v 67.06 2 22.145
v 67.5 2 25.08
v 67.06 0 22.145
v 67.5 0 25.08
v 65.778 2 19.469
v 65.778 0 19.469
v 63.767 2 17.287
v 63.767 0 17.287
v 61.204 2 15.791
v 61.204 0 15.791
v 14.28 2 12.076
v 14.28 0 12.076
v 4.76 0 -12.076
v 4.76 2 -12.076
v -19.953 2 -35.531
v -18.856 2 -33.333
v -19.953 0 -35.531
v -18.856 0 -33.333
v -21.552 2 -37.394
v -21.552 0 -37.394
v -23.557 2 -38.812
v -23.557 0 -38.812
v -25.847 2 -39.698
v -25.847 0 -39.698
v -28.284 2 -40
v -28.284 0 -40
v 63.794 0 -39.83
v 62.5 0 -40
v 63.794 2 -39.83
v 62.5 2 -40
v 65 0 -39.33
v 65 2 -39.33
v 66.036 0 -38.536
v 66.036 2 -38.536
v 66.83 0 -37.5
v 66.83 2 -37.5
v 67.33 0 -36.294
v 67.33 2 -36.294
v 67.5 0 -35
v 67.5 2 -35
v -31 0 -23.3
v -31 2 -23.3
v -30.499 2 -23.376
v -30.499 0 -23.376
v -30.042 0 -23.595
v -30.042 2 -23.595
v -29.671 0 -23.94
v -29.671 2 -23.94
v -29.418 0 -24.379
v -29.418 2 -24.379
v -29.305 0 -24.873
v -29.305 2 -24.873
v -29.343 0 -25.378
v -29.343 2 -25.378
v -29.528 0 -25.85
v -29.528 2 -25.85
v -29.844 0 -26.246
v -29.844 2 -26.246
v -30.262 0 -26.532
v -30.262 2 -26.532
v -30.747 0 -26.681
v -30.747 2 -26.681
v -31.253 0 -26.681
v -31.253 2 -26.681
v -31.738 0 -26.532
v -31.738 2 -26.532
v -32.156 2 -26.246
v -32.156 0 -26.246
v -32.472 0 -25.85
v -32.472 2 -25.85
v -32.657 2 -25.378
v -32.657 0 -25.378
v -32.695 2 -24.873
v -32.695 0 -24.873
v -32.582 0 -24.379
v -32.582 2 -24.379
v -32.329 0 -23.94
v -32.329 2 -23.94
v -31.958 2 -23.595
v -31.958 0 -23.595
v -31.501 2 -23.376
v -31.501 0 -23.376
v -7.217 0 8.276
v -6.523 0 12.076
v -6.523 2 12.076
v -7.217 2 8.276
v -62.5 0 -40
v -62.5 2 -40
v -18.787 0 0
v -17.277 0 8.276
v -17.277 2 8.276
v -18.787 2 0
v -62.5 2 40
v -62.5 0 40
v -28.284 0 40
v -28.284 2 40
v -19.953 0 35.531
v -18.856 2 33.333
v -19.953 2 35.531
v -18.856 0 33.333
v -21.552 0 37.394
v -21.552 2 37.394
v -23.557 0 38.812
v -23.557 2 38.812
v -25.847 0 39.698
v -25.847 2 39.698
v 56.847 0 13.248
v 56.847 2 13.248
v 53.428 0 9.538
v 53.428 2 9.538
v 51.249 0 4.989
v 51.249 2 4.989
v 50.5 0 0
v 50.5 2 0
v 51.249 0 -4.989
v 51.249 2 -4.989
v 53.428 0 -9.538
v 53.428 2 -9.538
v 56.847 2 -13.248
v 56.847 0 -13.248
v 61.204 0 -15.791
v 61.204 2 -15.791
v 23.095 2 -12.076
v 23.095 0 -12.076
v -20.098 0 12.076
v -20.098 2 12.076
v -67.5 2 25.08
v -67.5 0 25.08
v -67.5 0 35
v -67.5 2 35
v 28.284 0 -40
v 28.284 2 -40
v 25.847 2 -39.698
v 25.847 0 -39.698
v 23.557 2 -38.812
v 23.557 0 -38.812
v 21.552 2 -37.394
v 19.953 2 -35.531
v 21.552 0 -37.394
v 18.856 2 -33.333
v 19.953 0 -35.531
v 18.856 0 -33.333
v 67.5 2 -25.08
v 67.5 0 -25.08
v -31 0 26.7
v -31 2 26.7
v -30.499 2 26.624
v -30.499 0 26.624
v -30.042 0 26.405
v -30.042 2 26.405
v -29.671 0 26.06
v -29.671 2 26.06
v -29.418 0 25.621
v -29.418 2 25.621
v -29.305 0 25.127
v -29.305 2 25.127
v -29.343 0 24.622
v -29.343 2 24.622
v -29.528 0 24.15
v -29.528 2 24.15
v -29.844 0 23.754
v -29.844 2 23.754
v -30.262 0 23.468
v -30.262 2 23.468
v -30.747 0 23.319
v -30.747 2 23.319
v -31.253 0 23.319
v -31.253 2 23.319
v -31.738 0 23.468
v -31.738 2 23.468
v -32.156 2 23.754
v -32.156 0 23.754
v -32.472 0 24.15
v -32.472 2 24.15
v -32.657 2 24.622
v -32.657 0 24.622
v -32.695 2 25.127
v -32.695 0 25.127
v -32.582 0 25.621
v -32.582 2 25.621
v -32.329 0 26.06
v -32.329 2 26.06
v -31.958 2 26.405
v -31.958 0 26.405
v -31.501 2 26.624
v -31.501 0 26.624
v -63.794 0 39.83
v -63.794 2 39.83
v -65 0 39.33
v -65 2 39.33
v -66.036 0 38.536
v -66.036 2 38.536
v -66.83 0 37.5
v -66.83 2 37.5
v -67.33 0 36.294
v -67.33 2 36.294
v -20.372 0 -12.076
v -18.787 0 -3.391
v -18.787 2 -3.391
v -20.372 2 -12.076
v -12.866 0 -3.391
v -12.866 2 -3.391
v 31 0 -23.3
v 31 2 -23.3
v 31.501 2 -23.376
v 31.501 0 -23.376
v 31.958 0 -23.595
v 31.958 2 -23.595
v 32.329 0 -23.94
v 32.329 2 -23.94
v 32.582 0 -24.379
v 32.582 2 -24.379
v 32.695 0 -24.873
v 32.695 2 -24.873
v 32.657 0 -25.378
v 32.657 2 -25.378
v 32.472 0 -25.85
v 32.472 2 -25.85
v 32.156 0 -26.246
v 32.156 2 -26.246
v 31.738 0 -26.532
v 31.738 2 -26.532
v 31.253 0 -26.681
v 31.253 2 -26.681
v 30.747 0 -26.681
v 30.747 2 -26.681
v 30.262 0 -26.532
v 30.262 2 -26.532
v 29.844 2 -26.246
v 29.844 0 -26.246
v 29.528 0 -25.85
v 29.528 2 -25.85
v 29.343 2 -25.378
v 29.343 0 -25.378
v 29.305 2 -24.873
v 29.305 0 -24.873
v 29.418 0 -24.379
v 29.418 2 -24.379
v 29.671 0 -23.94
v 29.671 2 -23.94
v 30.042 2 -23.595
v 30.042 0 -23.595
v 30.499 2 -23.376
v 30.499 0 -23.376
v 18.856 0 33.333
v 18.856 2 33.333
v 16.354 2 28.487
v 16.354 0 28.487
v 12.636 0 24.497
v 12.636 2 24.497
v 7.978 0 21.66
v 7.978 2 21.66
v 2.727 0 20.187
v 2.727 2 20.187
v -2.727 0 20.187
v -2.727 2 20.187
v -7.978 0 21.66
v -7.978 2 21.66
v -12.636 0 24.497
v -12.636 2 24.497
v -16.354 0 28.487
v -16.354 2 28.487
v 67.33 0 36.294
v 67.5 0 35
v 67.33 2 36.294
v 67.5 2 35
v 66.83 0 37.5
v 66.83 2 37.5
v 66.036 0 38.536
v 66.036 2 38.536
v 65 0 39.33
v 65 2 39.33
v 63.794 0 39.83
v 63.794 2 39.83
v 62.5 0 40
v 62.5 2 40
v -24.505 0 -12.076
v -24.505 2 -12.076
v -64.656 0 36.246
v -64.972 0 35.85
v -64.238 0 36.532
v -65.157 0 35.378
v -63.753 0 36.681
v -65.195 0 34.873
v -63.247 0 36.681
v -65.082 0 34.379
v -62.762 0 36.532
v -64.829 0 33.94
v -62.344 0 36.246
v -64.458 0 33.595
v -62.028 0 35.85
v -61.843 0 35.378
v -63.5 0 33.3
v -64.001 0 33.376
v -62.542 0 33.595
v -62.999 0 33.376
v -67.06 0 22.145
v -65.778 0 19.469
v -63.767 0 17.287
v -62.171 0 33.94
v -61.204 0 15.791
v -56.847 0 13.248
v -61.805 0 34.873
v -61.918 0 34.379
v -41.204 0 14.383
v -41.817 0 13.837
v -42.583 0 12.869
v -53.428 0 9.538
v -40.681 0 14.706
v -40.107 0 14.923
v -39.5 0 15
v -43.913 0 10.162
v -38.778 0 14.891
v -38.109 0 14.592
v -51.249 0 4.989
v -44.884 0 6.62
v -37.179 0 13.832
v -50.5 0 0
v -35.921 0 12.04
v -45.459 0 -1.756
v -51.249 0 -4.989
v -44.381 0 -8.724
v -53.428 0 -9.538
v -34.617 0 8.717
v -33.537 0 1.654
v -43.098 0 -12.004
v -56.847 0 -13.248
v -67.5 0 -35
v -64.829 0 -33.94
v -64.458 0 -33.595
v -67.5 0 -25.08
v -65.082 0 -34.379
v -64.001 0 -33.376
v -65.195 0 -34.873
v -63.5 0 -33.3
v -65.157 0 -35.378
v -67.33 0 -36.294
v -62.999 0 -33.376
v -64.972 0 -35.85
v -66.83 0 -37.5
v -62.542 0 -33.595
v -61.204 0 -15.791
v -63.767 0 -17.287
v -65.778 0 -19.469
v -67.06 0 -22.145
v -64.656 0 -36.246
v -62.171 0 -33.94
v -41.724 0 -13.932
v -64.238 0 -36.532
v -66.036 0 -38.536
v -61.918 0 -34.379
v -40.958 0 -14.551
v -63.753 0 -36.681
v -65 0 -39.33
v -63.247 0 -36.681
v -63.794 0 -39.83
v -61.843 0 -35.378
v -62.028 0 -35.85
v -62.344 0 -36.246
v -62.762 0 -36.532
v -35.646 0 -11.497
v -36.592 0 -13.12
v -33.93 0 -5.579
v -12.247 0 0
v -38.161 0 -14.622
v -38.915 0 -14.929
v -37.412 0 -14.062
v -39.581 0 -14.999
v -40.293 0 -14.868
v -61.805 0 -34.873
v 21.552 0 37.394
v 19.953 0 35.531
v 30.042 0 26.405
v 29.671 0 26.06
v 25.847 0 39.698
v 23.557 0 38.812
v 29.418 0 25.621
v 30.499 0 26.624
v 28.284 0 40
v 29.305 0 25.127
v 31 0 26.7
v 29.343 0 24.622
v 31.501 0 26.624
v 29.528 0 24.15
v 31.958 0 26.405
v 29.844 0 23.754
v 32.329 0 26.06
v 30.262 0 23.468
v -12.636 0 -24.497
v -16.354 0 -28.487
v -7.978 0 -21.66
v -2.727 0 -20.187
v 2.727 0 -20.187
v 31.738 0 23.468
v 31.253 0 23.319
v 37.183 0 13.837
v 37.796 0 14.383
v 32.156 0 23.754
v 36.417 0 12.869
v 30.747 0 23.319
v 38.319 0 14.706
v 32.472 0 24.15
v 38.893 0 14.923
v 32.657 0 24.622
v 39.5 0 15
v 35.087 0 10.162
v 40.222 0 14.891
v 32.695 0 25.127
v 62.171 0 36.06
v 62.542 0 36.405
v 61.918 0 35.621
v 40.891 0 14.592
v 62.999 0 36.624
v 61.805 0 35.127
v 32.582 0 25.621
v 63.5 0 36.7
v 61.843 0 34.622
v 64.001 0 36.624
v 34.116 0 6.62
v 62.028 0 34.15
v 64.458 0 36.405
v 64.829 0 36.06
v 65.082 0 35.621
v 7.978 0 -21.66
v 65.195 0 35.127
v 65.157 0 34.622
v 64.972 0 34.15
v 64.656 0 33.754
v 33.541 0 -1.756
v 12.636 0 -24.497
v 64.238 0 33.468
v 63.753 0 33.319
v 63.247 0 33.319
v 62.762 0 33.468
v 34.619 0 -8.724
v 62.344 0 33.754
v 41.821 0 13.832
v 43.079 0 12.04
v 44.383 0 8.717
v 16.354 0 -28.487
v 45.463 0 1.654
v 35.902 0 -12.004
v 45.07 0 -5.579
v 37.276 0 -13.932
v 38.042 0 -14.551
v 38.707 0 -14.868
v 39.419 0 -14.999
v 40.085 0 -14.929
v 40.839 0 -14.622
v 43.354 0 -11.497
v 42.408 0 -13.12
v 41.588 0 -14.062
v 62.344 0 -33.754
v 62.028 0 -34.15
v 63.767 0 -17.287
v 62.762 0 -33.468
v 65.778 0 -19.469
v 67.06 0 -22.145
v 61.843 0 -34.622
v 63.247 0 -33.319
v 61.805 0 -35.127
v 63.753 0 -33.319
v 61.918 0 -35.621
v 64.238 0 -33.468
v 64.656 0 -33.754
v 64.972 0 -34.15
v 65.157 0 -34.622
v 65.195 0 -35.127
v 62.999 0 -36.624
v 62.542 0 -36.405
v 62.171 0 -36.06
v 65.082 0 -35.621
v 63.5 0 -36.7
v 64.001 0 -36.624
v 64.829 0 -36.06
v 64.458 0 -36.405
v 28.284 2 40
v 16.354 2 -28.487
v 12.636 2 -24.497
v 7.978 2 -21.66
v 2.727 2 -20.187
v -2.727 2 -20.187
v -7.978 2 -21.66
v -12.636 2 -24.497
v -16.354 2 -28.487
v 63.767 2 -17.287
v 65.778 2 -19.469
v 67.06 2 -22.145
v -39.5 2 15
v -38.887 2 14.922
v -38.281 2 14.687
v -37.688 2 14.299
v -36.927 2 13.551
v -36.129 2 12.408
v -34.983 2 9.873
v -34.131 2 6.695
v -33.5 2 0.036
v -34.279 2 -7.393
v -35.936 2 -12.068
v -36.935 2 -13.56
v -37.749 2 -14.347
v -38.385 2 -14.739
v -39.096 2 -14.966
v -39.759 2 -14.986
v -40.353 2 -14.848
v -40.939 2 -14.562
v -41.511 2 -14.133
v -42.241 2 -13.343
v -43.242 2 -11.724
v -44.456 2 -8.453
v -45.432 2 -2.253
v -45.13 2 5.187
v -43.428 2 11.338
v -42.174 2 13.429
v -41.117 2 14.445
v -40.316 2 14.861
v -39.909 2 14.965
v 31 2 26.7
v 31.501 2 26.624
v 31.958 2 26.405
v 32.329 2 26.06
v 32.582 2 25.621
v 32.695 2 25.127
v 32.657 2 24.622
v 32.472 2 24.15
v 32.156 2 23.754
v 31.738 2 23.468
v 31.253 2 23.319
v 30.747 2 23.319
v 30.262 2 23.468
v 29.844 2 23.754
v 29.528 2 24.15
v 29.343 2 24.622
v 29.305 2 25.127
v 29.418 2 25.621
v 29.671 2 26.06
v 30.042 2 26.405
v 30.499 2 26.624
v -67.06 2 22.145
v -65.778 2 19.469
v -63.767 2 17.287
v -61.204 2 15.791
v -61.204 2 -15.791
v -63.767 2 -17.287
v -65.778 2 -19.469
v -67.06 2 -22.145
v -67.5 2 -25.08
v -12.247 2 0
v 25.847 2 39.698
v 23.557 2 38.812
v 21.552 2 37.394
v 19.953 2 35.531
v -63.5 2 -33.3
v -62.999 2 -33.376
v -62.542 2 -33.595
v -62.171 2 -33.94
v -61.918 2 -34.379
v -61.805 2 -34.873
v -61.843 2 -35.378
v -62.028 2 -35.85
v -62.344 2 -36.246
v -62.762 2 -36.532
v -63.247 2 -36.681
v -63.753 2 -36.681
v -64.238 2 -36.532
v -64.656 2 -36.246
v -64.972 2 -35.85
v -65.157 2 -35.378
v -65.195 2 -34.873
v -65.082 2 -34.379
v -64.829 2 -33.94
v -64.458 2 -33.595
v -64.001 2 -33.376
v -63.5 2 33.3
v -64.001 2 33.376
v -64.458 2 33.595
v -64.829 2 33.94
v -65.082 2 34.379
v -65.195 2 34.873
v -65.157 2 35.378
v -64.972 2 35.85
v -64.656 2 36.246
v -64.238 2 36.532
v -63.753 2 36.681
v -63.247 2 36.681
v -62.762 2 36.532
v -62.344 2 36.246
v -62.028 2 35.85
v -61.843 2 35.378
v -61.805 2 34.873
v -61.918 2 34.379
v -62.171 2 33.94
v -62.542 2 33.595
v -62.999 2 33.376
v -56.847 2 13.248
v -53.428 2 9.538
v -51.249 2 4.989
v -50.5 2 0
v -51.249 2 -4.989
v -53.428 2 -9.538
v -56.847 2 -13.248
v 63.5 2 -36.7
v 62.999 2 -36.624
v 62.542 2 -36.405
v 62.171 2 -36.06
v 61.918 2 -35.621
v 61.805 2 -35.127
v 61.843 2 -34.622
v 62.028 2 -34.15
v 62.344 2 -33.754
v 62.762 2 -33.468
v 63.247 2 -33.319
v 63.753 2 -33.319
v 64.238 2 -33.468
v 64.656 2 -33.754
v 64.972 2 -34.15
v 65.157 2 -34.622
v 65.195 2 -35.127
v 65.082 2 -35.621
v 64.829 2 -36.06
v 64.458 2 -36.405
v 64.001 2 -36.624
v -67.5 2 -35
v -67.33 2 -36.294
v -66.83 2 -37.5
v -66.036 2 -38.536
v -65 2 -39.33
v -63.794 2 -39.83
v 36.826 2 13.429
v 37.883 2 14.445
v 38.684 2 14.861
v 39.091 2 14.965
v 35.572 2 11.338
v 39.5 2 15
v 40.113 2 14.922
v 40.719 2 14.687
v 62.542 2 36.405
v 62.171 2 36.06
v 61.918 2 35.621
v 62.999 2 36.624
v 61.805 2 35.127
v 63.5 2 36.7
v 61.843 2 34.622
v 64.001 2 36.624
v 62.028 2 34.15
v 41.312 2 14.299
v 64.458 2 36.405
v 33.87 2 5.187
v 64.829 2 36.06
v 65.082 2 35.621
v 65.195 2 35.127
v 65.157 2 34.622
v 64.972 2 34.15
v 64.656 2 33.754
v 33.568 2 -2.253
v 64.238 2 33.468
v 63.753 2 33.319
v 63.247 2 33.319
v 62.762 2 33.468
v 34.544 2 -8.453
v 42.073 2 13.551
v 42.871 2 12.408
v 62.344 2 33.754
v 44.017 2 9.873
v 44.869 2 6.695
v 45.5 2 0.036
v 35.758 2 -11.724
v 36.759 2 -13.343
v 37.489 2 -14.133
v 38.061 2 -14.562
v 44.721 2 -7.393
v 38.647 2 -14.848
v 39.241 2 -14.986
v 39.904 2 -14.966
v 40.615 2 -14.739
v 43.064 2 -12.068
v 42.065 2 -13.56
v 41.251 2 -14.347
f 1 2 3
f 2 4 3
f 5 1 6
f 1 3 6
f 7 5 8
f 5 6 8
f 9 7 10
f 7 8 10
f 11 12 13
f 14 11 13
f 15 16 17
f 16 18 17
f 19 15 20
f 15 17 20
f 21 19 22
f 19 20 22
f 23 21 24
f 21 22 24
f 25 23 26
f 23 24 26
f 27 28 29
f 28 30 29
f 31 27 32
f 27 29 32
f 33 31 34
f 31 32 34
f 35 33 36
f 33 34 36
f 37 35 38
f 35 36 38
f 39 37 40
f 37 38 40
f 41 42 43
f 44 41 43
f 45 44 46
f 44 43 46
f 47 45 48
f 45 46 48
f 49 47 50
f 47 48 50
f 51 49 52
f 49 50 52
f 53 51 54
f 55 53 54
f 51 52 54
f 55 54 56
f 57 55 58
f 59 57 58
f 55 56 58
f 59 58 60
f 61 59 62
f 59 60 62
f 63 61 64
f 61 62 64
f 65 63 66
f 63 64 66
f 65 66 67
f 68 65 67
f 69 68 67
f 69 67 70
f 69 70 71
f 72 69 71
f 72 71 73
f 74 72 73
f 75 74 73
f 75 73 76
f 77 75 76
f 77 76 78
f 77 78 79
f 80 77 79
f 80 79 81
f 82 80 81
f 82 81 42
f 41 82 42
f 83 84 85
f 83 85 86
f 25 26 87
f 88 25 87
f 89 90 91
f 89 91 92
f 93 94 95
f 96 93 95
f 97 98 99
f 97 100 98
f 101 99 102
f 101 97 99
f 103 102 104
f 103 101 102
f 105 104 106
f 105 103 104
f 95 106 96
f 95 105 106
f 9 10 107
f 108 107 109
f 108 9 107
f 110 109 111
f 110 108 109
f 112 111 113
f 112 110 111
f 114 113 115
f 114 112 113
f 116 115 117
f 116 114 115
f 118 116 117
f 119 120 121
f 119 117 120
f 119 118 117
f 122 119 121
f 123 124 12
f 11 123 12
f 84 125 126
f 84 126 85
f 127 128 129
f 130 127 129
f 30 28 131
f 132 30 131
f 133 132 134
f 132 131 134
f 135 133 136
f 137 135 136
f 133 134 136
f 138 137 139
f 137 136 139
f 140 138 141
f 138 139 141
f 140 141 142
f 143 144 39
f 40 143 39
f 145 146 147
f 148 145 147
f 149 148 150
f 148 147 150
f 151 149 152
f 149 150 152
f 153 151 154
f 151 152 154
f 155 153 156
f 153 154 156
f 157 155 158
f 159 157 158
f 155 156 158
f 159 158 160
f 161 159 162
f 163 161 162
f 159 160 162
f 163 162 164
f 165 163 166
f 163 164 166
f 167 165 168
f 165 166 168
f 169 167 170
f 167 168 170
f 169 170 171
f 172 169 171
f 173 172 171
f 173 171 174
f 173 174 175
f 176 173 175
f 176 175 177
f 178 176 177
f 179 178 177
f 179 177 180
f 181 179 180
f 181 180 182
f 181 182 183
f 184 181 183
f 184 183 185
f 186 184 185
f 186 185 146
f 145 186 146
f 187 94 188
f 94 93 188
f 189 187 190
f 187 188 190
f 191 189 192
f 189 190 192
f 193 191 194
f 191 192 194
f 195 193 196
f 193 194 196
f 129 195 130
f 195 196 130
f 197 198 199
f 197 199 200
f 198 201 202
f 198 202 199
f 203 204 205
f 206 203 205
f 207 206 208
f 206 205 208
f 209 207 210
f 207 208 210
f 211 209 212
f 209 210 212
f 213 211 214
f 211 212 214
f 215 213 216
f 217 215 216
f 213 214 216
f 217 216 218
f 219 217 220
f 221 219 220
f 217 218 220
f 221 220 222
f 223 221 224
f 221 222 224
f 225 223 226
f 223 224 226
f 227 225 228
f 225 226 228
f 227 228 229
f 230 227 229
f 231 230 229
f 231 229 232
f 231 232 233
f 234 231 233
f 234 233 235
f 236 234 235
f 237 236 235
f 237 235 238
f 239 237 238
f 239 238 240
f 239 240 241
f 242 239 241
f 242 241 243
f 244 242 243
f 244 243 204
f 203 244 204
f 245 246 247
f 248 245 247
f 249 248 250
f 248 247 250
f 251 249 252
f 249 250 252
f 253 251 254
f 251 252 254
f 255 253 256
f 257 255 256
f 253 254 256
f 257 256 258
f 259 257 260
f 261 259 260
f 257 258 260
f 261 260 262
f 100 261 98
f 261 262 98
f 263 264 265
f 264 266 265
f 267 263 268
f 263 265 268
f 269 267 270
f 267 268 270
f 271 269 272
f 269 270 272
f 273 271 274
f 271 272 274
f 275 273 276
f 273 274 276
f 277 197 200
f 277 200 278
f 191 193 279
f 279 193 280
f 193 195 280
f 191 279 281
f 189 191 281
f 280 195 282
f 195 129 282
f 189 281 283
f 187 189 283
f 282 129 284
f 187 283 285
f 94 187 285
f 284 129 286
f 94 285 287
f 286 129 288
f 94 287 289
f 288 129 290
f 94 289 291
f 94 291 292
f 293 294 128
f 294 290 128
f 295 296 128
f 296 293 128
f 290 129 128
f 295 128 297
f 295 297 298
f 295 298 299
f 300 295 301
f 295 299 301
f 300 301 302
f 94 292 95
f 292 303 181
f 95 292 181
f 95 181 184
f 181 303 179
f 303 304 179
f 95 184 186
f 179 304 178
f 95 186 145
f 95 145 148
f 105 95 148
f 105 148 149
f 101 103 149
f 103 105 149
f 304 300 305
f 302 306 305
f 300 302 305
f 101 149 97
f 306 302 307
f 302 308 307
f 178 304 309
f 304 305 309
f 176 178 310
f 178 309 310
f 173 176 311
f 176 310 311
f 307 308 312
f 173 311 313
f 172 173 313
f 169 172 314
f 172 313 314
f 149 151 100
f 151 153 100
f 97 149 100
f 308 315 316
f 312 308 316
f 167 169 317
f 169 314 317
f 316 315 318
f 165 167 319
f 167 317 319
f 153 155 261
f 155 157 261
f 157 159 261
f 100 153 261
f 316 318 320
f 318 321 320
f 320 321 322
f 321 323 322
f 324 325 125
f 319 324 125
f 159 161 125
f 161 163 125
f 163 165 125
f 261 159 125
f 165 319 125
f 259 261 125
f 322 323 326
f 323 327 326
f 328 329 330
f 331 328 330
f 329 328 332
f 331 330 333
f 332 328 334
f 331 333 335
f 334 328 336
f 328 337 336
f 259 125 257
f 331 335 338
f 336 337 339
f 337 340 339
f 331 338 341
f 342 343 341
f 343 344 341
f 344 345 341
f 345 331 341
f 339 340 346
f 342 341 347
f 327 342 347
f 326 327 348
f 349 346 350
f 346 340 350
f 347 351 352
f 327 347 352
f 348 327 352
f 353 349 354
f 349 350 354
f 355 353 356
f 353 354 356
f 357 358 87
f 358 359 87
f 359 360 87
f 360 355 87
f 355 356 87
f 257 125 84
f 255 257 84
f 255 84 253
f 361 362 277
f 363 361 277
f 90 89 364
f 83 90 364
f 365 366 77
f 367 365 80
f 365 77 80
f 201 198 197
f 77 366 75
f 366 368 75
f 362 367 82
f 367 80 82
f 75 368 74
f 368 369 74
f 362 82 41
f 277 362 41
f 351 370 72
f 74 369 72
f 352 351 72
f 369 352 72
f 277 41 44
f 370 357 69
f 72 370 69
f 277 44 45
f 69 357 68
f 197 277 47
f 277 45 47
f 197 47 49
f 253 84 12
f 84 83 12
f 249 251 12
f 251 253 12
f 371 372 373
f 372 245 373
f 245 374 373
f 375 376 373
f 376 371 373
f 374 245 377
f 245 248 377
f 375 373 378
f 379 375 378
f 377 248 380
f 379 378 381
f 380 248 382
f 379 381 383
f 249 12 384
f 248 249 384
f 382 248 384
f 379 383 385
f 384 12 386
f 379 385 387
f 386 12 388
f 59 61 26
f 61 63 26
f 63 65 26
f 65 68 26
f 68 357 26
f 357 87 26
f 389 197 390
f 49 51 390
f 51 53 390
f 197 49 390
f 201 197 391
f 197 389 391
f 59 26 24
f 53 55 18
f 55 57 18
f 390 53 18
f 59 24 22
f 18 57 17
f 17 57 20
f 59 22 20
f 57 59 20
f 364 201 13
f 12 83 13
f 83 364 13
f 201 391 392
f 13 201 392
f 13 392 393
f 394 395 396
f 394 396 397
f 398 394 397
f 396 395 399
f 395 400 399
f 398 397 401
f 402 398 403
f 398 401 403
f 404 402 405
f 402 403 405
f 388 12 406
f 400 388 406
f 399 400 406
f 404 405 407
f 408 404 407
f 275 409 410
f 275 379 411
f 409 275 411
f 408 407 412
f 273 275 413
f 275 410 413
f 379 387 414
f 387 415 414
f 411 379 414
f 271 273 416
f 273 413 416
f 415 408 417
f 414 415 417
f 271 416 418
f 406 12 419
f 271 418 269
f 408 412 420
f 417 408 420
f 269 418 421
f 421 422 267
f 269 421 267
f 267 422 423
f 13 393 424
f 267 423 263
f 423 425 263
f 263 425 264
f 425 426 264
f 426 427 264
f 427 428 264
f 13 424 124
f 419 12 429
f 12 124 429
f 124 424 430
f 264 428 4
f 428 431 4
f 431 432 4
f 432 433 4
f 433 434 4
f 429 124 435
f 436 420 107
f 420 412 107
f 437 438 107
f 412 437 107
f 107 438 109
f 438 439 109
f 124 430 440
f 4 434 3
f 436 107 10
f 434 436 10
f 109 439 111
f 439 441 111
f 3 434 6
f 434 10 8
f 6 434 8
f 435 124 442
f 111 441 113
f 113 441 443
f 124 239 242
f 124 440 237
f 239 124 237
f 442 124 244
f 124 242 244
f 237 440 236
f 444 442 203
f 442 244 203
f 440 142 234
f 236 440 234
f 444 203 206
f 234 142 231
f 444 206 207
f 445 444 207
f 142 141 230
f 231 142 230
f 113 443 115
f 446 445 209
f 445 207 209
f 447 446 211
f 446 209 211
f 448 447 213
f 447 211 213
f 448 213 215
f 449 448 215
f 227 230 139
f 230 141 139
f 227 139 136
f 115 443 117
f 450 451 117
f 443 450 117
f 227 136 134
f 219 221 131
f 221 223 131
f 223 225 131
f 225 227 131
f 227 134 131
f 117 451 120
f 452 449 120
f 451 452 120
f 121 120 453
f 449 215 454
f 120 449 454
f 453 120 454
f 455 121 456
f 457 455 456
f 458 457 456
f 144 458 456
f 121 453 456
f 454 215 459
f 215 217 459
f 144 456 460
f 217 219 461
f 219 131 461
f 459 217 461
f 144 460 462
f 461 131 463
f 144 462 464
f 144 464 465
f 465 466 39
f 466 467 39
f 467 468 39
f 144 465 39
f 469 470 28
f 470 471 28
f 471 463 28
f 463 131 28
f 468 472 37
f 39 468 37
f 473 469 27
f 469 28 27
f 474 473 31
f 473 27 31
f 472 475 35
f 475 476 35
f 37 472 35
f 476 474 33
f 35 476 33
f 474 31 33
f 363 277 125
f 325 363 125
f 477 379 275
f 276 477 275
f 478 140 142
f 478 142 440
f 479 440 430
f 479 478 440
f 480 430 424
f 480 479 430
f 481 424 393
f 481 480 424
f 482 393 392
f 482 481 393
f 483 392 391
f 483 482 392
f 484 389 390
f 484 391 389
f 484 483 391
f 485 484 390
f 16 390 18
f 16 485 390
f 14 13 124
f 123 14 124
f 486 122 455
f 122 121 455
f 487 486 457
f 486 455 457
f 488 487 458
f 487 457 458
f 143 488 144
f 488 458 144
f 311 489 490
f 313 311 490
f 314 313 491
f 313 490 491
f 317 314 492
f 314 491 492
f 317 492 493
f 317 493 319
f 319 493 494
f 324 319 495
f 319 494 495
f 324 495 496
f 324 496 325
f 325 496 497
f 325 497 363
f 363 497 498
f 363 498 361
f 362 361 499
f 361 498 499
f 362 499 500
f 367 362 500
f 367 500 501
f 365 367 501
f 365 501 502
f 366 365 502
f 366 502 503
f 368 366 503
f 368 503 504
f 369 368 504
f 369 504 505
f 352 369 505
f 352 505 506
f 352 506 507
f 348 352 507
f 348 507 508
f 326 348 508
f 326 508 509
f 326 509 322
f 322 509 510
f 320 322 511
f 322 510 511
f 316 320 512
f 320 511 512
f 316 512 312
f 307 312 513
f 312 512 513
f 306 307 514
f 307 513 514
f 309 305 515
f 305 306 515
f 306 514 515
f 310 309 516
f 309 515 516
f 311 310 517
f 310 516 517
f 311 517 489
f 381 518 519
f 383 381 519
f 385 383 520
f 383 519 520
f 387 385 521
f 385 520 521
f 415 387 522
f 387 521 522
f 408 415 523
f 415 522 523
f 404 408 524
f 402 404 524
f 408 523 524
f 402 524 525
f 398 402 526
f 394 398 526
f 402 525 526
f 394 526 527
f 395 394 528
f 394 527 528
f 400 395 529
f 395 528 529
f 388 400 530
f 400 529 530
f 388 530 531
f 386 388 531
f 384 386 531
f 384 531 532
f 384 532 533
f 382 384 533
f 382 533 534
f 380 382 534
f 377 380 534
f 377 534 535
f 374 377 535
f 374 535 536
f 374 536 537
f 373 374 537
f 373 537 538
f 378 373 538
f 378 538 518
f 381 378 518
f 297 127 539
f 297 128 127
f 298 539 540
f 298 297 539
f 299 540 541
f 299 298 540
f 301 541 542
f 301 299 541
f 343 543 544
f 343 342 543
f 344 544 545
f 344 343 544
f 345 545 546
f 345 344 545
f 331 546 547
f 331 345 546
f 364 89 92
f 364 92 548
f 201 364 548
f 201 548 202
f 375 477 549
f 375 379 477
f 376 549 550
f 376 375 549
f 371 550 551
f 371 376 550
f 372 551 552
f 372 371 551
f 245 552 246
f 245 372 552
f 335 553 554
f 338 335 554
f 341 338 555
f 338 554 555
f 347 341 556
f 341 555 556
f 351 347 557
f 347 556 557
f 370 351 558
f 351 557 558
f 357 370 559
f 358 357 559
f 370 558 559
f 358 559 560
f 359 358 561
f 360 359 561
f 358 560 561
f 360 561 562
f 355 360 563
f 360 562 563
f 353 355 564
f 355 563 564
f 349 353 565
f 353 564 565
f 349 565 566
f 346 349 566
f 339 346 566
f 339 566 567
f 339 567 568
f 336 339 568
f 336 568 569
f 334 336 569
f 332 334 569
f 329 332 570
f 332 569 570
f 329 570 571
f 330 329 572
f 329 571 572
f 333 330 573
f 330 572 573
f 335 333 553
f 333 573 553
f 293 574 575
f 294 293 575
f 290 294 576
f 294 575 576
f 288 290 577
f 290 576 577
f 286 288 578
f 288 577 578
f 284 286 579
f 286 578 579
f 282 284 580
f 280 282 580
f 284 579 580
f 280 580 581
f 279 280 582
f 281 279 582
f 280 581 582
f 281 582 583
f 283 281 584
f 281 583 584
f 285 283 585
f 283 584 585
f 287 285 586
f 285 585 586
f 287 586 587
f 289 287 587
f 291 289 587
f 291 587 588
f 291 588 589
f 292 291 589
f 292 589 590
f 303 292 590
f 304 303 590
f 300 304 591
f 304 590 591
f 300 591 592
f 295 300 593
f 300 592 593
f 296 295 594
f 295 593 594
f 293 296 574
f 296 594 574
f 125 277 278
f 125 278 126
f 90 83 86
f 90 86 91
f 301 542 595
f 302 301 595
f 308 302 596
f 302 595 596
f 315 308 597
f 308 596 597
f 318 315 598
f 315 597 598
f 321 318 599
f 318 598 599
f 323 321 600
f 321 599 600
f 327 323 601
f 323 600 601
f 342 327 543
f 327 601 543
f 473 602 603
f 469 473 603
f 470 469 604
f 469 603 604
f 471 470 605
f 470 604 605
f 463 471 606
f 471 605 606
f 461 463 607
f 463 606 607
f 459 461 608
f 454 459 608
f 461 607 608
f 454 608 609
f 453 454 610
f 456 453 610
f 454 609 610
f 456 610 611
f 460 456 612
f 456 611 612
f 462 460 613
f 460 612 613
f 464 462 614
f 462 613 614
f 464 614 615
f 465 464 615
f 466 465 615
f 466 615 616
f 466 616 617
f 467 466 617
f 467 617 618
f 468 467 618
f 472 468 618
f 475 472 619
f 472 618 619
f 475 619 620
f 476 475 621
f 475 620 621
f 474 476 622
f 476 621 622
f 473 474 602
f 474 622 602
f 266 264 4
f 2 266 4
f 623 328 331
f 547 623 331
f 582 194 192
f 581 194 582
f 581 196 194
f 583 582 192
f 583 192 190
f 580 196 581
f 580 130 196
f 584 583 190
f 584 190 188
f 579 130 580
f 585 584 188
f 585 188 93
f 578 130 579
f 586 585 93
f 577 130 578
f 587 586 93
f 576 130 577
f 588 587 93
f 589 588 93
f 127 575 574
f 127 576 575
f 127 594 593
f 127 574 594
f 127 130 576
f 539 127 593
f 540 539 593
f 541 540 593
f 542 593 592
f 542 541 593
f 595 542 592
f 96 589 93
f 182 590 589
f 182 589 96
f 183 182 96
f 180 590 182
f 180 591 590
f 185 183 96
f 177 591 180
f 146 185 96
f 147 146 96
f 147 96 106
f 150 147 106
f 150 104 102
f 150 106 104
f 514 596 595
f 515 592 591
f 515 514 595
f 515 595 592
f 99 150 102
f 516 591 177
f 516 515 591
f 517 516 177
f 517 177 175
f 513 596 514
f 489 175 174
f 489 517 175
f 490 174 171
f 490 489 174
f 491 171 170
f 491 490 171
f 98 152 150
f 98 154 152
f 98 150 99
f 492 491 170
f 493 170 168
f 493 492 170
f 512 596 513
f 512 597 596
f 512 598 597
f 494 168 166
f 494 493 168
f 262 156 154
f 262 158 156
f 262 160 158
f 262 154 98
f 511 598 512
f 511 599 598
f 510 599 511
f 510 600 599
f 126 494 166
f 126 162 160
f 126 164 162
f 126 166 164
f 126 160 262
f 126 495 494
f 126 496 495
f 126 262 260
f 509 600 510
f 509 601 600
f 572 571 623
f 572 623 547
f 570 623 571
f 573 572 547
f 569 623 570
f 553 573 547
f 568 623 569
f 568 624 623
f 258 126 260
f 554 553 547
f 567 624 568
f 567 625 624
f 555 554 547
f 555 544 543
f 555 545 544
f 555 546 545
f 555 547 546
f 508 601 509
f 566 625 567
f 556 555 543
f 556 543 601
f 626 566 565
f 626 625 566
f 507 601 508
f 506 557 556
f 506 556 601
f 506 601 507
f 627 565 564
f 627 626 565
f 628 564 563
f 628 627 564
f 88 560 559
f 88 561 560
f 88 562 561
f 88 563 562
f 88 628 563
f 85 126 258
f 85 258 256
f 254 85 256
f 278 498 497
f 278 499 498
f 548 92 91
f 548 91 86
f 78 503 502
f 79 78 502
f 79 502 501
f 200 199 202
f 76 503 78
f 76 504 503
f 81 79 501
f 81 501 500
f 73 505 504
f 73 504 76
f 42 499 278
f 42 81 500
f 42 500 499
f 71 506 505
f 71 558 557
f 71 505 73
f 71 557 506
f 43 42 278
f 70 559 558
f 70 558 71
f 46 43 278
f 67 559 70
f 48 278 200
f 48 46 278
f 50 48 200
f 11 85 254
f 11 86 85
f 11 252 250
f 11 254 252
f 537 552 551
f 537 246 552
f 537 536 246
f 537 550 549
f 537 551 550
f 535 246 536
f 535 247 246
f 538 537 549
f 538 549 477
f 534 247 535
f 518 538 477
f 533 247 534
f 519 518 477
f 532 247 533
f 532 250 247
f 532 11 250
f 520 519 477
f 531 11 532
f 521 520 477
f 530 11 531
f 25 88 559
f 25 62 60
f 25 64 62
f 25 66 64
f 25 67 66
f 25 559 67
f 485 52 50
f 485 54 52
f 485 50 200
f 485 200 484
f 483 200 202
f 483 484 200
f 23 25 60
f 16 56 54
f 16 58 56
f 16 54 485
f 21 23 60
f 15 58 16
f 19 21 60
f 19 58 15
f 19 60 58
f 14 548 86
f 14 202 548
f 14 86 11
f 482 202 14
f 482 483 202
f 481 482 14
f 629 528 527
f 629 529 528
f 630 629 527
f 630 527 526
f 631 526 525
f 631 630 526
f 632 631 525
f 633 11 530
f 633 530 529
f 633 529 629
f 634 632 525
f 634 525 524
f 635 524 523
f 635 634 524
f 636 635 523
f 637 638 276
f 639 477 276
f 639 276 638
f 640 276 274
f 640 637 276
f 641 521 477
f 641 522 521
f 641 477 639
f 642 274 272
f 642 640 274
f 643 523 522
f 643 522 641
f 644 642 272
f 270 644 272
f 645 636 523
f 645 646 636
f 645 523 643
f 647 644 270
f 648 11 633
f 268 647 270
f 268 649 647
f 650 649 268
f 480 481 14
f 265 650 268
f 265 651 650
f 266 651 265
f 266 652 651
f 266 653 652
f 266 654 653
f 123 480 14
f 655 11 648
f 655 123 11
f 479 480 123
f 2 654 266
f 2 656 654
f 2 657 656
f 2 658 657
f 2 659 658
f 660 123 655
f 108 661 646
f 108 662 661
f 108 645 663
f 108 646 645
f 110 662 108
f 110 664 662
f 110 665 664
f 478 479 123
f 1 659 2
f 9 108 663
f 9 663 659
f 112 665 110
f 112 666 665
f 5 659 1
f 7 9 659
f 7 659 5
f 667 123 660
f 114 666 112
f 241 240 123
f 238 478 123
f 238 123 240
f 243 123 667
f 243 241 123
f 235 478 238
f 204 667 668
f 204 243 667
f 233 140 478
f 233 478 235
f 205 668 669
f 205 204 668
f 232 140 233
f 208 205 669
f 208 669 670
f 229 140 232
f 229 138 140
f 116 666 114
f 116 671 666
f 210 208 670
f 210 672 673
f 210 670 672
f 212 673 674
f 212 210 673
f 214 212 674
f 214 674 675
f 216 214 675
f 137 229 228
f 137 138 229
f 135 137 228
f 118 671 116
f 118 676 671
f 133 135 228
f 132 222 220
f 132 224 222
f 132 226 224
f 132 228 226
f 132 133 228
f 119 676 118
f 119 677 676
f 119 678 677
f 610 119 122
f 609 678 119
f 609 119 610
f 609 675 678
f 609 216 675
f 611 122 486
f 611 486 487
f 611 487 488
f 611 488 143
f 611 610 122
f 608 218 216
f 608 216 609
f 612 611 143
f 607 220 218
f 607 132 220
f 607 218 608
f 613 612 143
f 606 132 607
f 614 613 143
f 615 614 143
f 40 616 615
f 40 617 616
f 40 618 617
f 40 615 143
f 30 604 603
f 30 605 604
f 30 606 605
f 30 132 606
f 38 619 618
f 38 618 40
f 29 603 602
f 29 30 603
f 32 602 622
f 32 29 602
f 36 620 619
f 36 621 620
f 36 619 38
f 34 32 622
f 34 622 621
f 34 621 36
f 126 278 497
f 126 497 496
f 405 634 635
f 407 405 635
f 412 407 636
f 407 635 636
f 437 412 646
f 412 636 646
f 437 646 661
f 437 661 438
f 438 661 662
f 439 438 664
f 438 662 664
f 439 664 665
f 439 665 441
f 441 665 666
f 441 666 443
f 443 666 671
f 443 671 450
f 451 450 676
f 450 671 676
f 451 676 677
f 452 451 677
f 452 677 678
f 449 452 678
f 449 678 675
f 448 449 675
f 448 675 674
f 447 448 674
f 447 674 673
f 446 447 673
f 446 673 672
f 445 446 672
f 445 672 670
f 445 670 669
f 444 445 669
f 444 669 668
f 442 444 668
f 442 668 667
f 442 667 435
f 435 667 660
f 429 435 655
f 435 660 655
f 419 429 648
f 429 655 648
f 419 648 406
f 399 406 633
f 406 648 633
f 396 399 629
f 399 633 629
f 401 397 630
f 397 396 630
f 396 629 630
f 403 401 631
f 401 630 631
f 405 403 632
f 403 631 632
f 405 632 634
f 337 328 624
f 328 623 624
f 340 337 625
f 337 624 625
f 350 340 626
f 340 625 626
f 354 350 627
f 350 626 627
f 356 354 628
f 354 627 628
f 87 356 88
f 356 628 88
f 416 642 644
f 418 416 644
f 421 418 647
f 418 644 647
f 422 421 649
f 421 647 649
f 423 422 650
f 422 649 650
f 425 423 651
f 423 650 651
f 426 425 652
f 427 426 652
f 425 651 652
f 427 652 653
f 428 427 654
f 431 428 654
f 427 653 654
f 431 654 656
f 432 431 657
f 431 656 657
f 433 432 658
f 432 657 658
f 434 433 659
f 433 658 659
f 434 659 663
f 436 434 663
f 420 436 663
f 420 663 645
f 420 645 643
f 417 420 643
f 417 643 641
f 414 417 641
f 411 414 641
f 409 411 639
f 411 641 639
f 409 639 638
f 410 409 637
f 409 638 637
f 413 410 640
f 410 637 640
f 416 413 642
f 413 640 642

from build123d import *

# Parameters (mm, degrees)
EXTRUDE_1_DEPTH     = 2
SKETCH_2_R          = 1.7
CUT_EXTRUDE_1_DEPTH = 2
SKETCH_3_R          = 1.7
CUT_EXTRUDE_2_DEPTH = 3
SKETCH_4_RX         = 15
SKETCH_4_RY         = 6
CUT_EXTRUDE_3_DEPTH = 3
FILLET_1_R          = 5
FILLET_2_R          = 10
CUT_EXTRUDE_5_DEPTH = 3


with BuildPart() as part:
    # 草图1 → 凸台-拉伸1 (new body)
    with BuildSketch(Plane(origin=(0, 0, 0), x_dir=(1, 0, 0), z_dir=(0, 1, 0))):
        Polygon((-10.5, -40), (25.5, -40), (67.5, -40), (67.5, -20), (67.5, 20), (67.5, 40), (25.5, 40), (-10.5, 40), (-67.5, 40), (-67.5, 20), (-67.5, -20), (-67.5, -40), align=None)
    extrude(amount=EXTRUDE_1_DEPTH)

    # 草图2 → 切除-拉伸1 (cut)
    with BuildSketch(Plane(origin=(0, 2, 0), x_dir=(1, 0, 0), z_dir=(0, 1, 0))):
        with Locations(Location((-63.5, 35, 0), (0, 0, 270))):
            Circle(SKETCH_2_R)
        with Locations(Location((63.5, 35, 0), (0, 0, 90))):
            Circle(SKETCH_2_R)
        with Locations(Location((63.5, -35, 0), (0, 0, 270))):
            Circle(SKETCH_2_R)
        with Locations(Location((-63.5, -35, 0), (0, 0, 90))):
            Circle(SKETCH_2_R)
    extrude(amount=-CUT_EXTRUDE_1_DEPTH, mode=Mode.SUBTRACT)

    # 草图3 → 切除-拉伸2 (cut)
    with BuildSketch(Plane(origin=(0, 2, 0), x_dir=(1, 0, 0), z_dir=(0, 1, 0))):
        with Locations(Location((-31, 25, 0), (0, 0, 270))):
            Circle(SKETCH_3_R)
        with Locations(Location((31, 25, 0), (0, 0, 270))):
            Circle(SKETCH_3_R)
        with Locations(Location((-31, -25, 0), (0, 0, 270))):
            Circle(SKETCH_3_R)
        with Locations(Location((31, -25, 0), (0, 0, 270))):
            Circle(SKETCH_3_R)
    extrude(amount=-CUT_EXTRUDE_2_DEPTH, mode=Mode.SUBTRACT)

    # 草图4 → 切除-拉伸3 (cut)
    with BuildSketch(Plane(origin=(0, 2, 0), x_dir=(1, 0, 0), z_dir=(0, 1, 0))):
        with Locations(Location((-39.5, 0), (0, 0, -90))):
            Ellipse(SKETCH_4_RX, SKETCH_4_RY)
        with Locations(Location((39.5, 0), (0, 0, -90))):
            Ellipse(SKETCH_4_RX, SKETCH_4_RY)
        with BuildLine():
            Line((-67.5, 17), (-67.5, -17))
            ThreePointArc((-67.5, -17), (-50.5, 0), (-67.5, 17))
        make_face()
        with BuildLine():
            Line((67.5, 17), (67.5, -17))
            ThreePointArc((67.5, -17), (50.5, 0), (67.5, 17))
        make_face()
        with BuildLine():
            Line((-20, 40), (20, 40))
            ThreePointArc((20, 40), (0, 20), (-20, 40))
        make_face()
        with BuildLine():
            Line((-20, -40), (20, -40))
            ThreePointArc((20, -40), (0, -20), (-20, -40))
        make_face()
    extrude(amount=-CUT_EXTRUDE_3_DEPTH, mode=Mode.SUBTRACT)

    # 圆角1
    fillet_1_edges = [part.edges().sort_by_distance(p)[0] for p in [
        (67.5, 1, -40),
        (67.5, 1, 40),
        (-67.5, 1, 40),
        (-67.5, 1, -40),
    ]]
    fillet(fillet_1_edges, radius=FILLET_1_R)

    # 圆角2
    fillet_2_edges = [part.edges().sort_by_distance(p)[0] for p in [
        (20, 1, -40),
        (-20, 1, -40),
        (-20, 1, 40),
        (20, 1, 40),
        (67.5, 1, 17),
        (67.5, 1, -17),
        (-67.5, 1, -17),
        (-67.5, 1, 17),
    ]]
    fillet(fillet_2_edges, radius=FILLET_2_R)

    # 草图6 → 切除-拉伸5 (cut)
    with BuildSketch(Plane.XZ):
        Polygon((-24.505396053, -12.076400213), (-20.097950719, 12.076400213), (-6.523019093, 12.076400213), (-7.216611088, 8.275516079), (-17.277185706, 8.275516079), (-18.787316377, 0), (-12.246898397, 0), (-12.865682091, -3.390934644), (-18.787316377, -3.390934644), (-20.37225535, -12.076400213), align=None)
        Polygon((14.28012288, 12.076400213), (4.76004096, -12.076400213), (23.095013546, -12.076400213), align=None)
    extrude(amount=-CUT_EXTRUDE_5_DEPTH, mode=Mode.SUBTRACT)


solid = part.part
